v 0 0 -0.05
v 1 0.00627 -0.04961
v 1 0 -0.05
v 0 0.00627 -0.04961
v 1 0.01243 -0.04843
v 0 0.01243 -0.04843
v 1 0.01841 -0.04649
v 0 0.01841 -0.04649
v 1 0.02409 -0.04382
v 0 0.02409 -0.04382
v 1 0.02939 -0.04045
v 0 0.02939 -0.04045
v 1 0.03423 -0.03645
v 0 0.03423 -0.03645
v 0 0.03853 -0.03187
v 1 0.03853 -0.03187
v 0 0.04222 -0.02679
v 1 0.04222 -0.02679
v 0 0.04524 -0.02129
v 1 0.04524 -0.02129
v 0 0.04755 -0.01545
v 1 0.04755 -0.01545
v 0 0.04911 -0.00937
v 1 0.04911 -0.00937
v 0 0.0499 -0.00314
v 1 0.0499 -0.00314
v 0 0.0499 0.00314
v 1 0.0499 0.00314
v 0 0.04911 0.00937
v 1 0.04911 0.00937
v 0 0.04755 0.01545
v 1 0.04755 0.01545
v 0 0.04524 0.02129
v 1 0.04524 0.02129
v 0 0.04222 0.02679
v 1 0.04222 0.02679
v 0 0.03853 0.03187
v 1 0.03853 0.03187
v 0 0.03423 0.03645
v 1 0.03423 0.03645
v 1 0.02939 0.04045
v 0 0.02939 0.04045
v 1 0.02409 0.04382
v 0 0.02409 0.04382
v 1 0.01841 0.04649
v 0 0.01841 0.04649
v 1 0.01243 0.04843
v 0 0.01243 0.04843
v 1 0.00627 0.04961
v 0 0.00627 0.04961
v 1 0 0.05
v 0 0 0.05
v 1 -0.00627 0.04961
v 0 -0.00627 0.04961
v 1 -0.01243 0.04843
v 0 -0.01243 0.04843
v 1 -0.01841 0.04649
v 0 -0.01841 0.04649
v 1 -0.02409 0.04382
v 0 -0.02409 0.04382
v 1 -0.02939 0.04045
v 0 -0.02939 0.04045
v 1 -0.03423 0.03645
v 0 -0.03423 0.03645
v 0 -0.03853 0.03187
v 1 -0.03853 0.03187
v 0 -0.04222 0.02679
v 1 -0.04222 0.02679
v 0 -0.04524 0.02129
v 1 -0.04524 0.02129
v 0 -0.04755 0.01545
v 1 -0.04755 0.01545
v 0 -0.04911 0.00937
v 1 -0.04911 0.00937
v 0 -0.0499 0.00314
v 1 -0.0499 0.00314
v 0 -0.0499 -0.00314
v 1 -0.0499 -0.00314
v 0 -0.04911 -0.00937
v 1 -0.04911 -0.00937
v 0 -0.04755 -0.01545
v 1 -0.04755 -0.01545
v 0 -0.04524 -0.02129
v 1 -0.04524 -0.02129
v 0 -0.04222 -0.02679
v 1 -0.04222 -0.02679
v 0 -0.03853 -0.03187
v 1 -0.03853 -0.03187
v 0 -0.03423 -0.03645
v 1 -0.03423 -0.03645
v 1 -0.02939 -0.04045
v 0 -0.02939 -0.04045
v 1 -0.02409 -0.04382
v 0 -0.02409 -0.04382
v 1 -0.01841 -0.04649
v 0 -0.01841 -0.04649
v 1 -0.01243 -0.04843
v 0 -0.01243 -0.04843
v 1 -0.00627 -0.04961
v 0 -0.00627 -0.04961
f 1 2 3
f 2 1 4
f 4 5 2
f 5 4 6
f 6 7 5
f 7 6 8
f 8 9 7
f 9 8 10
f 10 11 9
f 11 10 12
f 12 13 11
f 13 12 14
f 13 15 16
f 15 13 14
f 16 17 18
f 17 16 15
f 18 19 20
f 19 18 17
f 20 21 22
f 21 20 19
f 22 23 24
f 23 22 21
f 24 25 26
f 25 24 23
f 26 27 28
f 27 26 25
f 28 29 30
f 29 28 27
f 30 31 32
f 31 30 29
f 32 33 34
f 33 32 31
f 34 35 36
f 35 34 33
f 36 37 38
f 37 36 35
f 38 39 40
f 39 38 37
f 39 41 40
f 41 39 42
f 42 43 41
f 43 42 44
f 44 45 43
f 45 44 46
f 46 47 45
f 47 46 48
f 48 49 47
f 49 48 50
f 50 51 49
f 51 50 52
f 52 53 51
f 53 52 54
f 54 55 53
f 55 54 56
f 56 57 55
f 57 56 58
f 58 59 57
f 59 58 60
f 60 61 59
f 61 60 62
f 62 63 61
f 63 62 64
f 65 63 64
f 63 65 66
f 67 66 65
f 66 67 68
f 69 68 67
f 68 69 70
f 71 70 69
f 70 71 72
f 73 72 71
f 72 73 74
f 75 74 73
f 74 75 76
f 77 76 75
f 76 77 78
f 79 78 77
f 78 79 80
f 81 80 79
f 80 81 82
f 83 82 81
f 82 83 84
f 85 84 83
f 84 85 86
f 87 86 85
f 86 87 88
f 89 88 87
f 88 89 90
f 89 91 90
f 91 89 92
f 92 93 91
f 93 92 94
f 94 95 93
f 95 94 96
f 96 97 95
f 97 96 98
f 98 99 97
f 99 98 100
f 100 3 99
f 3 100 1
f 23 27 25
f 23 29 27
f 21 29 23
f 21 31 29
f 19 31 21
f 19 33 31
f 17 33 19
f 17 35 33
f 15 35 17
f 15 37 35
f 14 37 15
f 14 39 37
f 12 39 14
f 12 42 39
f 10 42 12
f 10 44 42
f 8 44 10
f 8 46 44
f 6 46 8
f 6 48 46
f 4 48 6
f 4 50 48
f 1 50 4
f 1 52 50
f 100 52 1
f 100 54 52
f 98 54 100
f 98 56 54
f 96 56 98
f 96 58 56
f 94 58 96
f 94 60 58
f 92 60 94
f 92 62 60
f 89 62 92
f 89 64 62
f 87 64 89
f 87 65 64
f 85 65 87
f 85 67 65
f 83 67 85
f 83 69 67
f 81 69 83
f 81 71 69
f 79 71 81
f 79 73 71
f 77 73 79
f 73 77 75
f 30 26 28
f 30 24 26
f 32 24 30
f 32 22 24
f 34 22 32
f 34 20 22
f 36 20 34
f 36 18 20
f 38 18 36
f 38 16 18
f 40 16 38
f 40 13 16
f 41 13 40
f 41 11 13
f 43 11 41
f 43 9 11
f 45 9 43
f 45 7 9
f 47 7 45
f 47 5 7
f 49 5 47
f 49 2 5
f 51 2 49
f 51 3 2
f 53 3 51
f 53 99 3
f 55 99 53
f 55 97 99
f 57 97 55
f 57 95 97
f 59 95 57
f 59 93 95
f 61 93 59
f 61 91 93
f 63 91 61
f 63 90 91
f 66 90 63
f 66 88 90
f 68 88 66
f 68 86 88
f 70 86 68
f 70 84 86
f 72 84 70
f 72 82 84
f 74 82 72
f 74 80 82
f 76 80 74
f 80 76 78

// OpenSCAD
$fn=50;  // REMOVE
LENGTH = 1;  // REMOVE
DO = 0.1; // REMOVE
rotate([0,90,0]) cylinder(h=(LENGTH), r=(DO)/2);
